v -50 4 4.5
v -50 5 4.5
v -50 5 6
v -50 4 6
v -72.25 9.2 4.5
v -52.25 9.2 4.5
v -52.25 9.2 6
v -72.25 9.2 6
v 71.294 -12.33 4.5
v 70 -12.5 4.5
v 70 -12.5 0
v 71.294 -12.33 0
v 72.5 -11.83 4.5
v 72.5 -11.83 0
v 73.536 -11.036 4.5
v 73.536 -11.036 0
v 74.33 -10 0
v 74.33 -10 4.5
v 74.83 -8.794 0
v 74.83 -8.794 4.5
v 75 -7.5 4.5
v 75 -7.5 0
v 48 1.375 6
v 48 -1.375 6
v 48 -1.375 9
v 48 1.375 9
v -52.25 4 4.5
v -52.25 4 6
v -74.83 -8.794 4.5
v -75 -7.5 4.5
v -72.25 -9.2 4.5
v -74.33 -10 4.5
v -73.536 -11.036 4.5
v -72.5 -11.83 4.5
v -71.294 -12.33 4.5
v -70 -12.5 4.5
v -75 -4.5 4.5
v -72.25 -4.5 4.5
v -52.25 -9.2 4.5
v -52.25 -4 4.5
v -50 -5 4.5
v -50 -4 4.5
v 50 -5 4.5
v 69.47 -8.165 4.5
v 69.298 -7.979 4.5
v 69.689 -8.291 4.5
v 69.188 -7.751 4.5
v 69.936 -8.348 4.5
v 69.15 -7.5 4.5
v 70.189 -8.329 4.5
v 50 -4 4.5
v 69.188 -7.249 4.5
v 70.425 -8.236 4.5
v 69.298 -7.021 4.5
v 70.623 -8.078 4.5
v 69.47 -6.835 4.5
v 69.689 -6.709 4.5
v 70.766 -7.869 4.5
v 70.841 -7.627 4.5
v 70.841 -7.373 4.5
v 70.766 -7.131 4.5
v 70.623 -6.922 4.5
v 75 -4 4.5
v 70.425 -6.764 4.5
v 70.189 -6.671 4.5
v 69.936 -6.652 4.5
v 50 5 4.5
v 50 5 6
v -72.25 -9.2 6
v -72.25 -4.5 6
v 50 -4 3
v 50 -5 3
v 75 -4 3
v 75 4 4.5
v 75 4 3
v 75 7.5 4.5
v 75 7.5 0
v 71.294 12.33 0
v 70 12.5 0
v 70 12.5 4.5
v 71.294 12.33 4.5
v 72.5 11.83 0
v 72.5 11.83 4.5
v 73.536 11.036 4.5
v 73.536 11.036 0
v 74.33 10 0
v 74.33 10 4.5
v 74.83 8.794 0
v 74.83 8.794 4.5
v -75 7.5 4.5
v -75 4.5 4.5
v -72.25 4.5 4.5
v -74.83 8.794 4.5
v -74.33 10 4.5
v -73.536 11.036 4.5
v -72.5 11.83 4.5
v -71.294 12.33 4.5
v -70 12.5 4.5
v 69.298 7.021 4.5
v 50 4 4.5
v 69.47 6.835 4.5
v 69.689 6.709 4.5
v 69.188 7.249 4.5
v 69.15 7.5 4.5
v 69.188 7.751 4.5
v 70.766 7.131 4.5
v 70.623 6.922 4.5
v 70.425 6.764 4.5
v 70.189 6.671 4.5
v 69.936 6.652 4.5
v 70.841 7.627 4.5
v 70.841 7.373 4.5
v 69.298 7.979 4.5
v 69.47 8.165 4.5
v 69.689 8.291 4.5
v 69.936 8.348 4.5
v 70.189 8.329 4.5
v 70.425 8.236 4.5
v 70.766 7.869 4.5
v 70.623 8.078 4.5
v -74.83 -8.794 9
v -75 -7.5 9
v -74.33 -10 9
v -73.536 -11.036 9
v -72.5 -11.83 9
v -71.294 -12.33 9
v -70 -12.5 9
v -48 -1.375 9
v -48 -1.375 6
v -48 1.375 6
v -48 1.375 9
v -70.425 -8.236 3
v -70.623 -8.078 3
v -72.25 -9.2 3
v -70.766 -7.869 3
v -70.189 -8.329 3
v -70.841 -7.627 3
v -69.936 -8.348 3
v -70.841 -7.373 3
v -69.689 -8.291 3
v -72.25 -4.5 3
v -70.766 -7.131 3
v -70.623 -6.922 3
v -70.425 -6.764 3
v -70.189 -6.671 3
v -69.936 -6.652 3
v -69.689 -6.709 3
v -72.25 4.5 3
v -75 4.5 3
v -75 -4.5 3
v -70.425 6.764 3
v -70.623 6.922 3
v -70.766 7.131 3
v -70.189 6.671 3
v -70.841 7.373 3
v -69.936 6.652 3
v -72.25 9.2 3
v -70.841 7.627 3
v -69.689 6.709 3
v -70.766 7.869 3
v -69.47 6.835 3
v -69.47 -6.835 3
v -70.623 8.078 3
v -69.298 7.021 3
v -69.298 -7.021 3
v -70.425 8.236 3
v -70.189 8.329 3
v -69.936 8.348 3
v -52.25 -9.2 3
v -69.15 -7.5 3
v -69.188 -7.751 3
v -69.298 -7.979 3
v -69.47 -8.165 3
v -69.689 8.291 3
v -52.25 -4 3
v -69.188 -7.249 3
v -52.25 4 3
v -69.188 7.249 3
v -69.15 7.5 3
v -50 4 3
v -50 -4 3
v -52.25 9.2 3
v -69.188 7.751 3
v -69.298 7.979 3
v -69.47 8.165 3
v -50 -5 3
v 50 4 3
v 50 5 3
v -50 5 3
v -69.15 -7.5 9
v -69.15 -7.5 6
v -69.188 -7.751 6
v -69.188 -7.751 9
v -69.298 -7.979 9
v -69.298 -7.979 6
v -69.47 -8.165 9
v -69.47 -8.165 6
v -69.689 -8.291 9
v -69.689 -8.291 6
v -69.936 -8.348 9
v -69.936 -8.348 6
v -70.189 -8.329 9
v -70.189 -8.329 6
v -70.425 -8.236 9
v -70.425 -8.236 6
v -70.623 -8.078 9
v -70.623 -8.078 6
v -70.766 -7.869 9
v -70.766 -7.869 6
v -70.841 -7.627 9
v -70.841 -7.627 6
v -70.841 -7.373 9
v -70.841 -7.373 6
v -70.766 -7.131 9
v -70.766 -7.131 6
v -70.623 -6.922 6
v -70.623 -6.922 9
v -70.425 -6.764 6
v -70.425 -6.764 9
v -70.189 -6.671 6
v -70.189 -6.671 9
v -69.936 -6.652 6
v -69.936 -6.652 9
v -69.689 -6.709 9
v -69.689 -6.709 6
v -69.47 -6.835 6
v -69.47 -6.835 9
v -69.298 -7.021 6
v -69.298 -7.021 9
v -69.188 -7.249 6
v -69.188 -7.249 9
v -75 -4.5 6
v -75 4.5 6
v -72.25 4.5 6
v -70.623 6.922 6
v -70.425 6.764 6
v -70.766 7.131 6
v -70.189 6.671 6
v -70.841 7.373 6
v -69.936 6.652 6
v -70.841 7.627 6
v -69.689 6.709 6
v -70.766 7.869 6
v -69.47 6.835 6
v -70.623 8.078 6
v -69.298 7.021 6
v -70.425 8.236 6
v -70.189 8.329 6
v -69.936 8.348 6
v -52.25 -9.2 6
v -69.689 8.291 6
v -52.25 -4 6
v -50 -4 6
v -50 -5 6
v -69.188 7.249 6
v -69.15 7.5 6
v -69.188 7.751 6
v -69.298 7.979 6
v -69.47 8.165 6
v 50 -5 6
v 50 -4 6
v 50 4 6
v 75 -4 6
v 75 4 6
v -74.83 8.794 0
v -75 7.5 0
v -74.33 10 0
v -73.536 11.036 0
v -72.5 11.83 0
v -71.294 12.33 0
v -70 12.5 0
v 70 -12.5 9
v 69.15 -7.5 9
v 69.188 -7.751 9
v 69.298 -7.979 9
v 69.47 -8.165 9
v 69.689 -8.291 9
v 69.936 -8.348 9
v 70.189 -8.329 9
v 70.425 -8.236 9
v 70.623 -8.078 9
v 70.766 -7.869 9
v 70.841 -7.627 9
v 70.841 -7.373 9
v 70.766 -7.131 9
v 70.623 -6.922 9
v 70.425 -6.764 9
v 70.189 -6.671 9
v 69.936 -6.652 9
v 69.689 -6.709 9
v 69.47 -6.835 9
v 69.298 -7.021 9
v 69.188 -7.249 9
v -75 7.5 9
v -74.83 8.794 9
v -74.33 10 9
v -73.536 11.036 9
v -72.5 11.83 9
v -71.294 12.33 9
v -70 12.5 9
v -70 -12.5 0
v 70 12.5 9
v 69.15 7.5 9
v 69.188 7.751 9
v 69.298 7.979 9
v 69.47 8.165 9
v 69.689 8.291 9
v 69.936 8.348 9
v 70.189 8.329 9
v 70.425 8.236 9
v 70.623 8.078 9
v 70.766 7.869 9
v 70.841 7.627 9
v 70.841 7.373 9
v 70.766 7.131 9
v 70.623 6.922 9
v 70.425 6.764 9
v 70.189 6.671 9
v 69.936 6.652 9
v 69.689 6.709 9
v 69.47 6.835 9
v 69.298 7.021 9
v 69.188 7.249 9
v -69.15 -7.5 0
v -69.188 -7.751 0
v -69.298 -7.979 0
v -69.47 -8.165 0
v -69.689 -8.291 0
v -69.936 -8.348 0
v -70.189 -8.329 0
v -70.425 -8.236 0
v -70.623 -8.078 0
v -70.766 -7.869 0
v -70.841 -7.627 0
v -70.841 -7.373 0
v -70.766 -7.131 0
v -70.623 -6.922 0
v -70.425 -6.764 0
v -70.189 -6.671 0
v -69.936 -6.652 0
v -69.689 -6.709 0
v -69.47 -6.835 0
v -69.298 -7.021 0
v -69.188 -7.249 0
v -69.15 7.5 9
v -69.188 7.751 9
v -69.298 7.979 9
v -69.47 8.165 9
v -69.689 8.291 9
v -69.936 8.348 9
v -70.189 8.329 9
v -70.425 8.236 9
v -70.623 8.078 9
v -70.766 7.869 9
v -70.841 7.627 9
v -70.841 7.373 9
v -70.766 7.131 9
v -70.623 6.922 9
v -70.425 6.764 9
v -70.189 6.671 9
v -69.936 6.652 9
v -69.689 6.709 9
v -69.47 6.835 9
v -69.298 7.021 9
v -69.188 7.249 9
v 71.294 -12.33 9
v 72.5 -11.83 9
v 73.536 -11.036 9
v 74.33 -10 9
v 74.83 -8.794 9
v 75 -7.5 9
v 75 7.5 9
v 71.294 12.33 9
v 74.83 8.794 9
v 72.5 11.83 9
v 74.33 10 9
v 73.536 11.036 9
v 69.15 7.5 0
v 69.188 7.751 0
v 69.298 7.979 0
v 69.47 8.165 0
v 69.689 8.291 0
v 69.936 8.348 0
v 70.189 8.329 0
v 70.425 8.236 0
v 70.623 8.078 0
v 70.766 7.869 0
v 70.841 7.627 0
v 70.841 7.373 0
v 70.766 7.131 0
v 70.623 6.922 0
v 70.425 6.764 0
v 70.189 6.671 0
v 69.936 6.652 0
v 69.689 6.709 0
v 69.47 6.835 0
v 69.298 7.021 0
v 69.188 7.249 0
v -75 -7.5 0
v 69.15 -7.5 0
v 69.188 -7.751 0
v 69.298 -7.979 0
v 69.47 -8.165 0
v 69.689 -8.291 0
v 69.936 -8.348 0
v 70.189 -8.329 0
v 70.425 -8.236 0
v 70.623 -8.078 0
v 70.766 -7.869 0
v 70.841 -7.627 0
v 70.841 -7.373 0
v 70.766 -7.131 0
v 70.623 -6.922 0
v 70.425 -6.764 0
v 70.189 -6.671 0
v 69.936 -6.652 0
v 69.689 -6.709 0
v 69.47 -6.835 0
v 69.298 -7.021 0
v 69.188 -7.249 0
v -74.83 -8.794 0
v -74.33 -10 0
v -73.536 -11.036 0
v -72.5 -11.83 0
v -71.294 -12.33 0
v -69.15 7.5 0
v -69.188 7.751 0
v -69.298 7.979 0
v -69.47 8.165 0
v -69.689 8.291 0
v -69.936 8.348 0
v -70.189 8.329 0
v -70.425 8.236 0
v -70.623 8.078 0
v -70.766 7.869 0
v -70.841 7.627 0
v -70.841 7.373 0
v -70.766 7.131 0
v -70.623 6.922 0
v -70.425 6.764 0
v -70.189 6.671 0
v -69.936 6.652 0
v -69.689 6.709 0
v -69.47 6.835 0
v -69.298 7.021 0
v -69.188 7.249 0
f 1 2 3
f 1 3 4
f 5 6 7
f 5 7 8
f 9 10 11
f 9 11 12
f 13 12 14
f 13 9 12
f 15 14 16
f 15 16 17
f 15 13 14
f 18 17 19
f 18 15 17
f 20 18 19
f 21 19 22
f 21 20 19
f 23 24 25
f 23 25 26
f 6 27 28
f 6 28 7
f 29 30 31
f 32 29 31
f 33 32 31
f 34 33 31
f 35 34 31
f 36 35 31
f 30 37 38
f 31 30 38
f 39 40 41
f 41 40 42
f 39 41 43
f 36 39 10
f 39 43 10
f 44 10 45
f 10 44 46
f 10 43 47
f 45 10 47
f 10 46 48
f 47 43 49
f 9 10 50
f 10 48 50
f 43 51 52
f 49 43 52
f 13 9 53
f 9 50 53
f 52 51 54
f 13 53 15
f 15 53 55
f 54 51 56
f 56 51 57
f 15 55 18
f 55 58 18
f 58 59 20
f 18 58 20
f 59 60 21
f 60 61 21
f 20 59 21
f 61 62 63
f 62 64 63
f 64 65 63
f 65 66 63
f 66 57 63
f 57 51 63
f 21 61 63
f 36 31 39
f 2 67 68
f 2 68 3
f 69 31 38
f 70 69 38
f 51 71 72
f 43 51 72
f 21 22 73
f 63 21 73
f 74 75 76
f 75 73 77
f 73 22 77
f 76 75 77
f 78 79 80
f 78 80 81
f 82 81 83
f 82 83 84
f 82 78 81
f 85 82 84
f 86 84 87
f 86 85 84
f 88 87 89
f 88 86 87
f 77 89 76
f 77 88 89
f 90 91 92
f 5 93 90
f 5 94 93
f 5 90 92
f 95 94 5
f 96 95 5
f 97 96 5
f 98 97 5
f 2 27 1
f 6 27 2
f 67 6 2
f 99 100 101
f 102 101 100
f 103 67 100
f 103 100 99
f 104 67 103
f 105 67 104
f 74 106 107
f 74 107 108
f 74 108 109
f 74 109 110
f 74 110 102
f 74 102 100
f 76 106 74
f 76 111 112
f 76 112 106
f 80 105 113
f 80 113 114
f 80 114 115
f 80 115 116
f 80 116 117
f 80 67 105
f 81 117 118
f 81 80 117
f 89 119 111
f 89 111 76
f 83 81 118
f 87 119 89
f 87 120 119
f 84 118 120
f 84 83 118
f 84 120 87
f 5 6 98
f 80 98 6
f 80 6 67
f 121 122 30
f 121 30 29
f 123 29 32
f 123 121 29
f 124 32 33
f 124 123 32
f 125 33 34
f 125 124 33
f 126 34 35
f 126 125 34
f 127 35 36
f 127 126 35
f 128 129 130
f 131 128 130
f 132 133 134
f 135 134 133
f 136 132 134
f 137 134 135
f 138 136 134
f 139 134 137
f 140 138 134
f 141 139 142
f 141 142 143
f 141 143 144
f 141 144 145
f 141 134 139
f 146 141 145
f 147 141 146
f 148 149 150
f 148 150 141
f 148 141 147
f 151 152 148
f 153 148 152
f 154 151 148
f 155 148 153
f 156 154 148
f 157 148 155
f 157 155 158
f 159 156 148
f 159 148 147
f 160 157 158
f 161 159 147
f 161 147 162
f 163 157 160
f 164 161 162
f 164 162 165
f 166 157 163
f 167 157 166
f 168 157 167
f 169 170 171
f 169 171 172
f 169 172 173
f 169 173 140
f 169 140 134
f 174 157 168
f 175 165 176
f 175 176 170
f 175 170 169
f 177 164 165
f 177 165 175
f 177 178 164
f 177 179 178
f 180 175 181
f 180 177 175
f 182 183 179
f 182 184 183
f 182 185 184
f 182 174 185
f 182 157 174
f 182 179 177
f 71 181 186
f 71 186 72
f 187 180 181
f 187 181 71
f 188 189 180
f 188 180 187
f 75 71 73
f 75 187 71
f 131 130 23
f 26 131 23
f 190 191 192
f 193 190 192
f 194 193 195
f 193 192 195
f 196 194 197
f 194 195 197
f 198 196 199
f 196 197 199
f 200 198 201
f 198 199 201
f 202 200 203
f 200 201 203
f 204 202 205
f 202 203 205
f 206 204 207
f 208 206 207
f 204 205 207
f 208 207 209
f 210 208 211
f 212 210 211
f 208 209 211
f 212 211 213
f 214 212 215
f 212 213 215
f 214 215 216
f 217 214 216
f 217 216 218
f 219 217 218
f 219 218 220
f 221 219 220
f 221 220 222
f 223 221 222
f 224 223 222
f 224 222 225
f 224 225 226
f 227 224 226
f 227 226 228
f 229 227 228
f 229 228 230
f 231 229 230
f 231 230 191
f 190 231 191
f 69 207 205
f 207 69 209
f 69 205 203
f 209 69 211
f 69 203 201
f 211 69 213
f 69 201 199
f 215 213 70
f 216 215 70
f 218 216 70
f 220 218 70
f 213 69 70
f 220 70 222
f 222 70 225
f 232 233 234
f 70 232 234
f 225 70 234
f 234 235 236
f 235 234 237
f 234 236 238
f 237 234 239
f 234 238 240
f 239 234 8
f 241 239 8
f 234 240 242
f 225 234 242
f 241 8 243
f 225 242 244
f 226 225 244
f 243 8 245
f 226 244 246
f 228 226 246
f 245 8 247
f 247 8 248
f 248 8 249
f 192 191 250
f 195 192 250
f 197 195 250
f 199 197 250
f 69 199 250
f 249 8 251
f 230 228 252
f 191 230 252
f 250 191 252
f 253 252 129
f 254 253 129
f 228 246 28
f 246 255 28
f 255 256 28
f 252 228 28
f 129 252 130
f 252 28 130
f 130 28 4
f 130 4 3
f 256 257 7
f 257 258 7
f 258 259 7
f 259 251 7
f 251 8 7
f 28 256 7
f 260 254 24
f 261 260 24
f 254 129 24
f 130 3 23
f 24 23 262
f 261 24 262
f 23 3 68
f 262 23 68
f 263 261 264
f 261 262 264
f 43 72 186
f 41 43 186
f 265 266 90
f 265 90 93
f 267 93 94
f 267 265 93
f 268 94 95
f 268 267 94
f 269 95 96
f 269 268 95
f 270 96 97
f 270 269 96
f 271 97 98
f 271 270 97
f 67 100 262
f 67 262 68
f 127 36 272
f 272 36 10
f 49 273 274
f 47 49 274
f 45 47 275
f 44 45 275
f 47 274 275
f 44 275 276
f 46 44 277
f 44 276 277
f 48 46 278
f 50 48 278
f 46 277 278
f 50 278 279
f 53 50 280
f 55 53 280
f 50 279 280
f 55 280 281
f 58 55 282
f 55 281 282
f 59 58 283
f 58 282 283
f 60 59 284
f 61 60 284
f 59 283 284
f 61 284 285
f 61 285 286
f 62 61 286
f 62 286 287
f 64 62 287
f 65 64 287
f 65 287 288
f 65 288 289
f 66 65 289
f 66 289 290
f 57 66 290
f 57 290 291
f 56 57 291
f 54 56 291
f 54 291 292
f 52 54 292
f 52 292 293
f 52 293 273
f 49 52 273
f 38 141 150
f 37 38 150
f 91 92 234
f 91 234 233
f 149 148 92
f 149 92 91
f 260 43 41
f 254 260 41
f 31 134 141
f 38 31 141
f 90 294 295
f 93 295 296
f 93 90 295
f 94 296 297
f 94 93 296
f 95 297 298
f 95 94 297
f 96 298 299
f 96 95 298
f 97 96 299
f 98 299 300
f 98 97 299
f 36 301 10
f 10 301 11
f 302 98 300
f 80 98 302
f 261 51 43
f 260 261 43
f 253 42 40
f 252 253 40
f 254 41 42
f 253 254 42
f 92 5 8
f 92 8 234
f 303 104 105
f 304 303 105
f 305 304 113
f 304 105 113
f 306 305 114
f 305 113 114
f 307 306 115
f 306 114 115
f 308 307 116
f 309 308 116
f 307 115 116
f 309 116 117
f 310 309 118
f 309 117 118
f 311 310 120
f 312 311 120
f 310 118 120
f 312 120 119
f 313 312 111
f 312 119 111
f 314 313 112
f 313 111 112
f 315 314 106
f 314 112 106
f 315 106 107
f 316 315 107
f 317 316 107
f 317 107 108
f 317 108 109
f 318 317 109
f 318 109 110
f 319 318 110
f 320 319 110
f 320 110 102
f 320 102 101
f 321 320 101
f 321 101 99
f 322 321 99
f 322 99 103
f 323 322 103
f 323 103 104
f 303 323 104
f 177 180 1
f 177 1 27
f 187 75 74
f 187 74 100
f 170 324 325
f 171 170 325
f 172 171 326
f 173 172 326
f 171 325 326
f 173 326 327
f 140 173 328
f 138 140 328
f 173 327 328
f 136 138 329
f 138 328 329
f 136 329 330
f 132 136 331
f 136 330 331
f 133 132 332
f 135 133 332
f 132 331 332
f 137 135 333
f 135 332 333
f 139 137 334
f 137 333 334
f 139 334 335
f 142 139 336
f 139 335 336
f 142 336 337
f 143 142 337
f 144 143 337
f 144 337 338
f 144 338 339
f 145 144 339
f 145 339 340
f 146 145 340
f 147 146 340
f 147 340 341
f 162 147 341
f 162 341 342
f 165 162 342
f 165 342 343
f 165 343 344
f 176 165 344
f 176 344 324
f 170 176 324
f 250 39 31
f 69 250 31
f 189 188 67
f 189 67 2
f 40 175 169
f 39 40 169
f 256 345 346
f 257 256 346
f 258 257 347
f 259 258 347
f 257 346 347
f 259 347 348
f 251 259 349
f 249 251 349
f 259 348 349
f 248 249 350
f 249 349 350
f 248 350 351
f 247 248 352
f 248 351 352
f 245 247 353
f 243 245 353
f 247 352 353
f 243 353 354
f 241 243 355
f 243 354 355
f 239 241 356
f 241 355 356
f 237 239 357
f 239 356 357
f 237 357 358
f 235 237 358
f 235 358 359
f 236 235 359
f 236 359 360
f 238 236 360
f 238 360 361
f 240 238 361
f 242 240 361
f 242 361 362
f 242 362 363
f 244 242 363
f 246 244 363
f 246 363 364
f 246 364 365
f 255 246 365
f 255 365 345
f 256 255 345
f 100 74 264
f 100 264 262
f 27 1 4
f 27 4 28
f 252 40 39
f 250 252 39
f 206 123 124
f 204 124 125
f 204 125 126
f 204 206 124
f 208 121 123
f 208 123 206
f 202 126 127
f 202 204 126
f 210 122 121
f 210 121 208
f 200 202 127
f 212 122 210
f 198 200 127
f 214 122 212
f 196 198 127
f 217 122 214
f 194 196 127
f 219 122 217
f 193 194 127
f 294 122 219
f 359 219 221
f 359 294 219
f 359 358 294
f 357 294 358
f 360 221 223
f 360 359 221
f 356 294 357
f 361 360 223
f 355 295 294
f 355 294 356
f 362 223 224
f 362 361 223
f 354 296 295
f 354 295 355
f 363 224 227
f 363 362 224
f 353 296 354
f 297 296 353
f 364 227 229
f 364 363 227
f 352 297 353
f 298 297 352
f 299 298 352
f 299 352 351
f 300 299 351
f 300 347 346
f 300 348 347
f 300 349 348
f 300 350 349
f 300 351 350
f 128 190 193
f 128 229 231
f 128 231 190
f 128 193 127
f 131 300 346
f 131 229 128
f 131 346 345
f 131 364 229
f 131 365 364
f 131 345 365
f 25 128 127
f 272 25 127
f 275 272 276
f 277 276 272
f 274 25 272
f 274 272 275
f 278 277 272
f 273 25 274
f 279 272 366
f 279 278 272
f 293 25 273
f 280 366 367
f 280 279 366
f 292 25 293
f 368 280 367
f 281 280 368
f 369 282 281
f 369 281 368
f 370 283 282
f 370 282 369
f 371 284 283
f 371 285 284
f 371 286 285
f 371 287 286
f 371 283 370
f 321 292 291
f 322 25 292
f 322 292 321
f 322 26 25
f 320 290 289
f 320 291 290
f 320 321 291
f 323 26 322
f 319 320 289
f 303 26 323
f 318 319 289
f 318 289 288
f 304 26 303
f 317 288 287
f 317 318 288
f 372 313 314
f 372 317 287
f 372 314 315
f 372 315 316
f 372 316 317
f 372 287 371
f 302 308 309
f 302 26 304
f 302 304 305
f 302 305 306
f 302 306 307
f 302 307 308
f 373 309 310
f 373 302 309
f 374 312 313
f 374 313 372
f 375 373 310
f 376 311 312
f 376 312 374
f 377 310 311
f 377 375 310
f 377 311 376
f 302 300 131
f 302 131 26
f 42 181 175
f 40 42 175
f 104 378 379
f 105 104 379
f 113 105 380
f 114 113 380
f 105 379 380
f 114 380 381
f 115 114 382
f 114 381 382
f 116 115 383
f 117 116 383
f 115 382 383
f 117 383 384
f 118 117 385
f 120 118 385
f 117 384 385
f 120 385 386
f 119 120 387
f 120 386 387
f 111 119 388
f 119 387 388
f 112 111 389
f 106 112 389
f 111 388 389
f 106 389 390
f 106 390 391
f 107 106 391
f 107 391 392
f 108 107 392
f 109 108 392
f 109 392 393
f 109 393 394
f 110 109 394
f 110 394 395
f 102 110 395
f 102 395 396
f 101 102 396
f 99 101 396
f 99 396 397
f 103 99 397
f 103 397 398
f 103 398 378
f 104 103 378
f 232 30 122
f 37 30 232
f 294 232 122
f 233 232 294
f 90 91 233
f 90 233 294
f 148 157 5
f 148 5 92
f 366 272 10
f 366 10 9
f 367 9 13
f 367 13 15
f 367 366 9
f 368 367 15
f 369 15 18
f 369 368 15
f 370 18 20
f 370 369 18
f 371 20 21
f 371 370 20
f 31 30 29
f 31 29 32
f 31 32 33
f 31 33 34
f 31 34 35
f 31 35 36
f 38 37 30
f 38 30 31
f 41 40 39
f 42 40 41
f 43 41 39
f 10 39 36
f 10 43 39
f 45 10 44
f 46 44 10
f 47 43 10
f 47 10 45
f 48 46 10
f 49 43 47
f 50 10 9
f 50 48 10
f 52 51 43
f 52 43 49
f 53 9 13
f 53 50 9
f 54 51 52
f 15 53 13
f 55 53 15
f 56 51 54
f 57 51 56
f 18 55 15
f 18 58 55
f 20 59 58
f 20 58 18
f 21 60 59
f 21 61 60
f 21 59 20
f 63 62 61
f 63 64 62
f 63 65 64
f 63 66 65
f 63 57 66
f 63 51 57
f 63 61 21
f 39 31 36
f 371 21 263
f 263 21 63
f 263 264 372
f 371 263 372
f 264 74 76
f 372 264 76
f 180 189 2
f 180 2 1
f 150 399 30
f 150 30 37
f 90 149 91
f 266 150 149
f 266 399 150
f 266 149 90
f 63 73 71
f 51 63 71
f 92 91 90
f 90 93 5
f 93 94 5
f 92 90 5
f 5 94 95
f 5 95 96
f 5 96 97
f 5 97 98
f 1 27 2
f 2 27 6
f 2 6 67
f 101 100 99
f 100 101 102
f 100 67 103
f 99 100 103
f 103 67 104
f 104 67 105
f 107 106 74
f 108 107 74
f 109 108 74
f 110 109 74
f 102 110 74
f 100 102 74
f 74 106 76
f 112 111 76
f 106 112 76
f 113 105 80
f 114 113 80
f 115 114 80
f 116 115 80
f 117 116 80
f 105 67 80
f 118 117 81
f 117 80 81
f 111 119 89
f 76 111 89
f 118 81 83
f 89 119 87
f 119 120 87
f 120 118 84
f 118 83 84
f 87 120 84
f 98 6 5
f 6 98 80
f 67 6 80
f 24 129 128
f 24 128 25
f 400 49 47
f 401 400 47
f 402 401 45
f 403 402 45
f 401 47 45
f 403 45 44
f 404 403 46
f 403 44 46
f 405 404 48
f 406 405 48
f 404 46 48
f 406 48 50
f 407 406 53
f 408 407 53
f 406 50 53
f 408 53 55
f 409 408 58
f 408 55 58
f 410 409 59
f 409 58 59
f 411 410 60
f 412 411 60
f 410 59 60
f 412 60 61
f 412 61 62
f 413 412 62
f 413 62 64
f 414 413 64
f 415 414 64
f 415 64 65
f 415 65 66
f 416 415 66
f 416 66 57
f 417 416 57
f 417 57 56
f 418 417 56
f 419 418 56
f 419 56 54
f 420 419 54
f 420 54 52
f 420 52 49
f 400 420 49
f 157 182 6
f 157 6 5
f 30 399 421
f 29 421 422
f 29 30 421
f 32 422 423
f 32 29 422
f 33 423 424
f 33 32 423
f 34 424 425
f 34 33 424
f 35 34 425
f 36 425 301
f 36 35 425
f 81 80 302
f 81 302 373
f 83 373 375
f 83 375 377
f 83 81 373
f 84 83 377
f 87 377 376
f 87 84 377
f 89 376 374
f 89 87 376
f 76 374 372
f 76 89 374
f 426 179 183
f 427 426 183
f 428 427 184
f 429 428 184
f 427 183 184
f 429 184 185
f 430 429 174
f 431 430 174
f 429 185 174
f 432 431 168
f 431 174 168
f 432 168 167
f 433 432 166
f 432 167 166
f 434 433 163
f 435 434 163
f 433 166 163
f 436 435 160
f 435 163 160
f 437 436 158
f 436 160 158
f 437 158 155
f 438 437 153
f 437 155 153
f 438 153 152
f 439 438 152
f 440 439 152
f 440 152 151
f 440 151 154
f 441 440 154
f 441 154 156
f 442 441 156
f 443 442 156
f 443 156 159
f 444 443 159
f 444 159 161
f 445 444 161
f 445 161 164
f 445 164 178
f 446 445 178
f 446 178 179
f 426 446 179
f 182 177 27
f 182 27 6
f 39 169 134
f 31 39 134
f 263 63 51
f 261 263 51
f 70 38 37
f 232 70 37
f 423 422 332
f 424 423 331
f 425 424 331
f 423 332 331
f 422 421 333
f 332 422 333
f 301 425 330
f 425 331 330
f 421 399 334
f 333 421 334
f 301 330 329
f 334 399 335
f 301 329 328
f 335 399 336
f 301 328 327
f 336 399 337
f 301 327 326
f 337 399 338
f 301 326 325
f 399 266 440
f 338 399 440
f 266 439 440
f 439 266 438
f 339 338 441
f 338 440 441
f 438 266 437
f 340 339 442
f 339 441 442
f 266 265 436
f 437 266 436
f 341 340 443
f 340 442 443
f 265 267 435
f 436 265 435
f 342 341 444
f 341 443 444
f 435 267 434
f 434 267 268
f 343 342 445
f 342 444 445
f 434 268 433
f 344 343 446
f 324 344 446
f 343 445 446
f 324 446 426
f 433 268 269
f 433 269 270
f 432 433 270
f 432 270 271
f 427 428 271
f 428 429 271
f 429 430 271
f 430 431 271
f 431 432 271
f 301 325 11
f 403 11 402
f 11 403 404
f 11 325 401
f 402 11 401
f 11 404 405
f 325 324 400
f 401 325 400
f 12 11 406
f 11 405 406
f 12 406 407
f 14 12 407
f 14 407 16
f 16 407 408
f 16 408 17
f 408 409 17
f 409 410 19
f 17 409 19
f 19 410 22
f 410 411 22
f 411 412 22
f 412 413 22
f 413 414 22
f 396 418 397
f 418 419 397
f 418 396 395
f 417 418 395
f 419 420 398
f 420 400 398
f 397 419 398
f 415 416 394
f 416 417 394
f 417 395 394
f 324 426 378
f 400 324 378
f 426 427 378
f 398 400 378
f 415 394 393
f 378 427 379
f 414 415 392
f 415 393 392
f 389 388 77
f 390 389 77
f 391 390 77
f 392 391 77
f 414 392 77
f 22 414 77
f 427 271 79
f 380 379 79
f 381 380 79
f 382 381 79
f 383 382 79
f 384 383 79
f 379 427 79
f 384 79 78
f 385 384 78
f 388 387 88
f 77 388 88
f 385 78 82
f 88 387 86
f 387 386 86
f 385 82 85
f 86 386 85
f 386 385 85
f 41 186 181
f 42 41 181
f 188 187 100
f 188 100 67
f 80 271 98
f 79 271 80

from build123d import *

# Parameters (mm, degrees)
BOX_BOTTOM_HALF_0_W     = 152
BOX_BOTTOM_HALF_0_H     = 27
BOX_BOTTOM_HALF_0_DEPTH = 5.5
SKETCH_W                = 150
SKETCH_H                = 25
PAD_DEPTH               = 3
PAD001_DEPTH            = 3
SKETCH004_W             = 150
SKETCH004_H             = 25
SKETCH004_W_2           = 96
SKETCH004_H_2           = 2.75
PAD002_DEPTH            = 3
SKETCH005_R             = 0.85
POCKET_DEPTH            = 313.671314
POLARPATTERN_COUNT      = 2
POLARPATTERN001_COUNT   = 2
POLARPATTERN002_COUNT   = 2
FILLET_R                = 5


with BuildPart() as box_bottom_half_0_body:
    # box_bottom_half_0 → box_bottom_half_0 (new body)
    with BuildSketch(Plane(origin=(-76, -13.5, -1), x_dir=(1, 0, 0), z_dir=(0, 0, 1))):
        with Locations((76, 13.5)):
            Rectangle(BOX_BOTTOM_HALF_0_W, BOX_BOTTOM_HALF_0_H)
    extrude(amount=BOX_BOTTOM_HALF_0_DEPTH)


with BuildPart() as body:
    # Sketch → Pad (new body)
    with BuildSketch(Plane.XY):
        Rectangle(SKETCH_W, SKETCH_H)
    extrude(amount=PAD_DEPTH)

    # Sketch001 (on Face6 of Pad) → Pad001 (join)
    with BuildSketch(Plane.XY.offset(3)):
        Polygon((-75, 12.5), (75, 12.5), (75, 4), (50, 4), (50, 5), (-50, 5), (-50, 4), (-52.25, 4), (-52.25, 9.2), (-72.25, 9.2), (-72.25, 4.5), (-75, 4.5), align=None)
        Polygon((-75, -12.5), (75, -12.5), (75, -4), (50, -4), (50, -5), (-50, -5), (-50, -4), (-52.25, -4), (-52.25, -9.2), (-72.25, -9.2), (-72.25, -4.5), (-75, -4.5), align=None)
    extrude(amount=PAD001_DEPTH)

    # Sketch004 (on Face12 of Pad001) → Pad002 (join)
    with BuildSketch(Plane.XY.offset(6)):
        Rectangle(SKETCH004_W, SKETCH004_H)
        Rectangle(SKETCH004_W_2, SKETCH004_H_2, mode=Mode.SUBTRACT)
    extrude(amount=PAD002_DEPTH)

    # Sketch005 (on Face34 of Pad002) → Pocket (cut, through all)
    with BuildSketch(Plane.XY.offset(9)):
        with Locations((-70, 7.5)):
            Circle(SKETCH005_R)
    pocket = extrude(amount=-POCKET_DEPTH, mode=Mode.SUBTRACT)

    # PolarPattern: Pocket ×2 about axis
    polarpattern_axis = Axis((0, 0, 9), (0, 0, 1))
    for i in range(1, POLARPATTERN_COUNT):
        add(pocket.rotate(polarpattern_axis, i * 360 / POLARPATTERN_COUNT), mode=Mode.SUBTRACT)

    # PolarPattern001: Pocket ×2 about axis
    polarpattern001_axis = Axis((0, 0, 0), (0, 1, 0))
    for i in range(1, POLARPATTERN001_COUNT):
        add(pocket.rotate(polarpattern001_axis, i * 360 / POLARPATTERN001_COUNT), mode=Mode.SUBTRACT)

    # PolarPattern002: Pocket ×2 about axis
    polarpattern002_axis = Axis((0, 0, 0), (1, 0, 0))
    for i in range(1, POLARPATTERN002_COUNT):
        add(pocket.rotate(polarpattern002_axis, i * 360 / POLARPATTERN002_COUNT), mode=Mode.SUBTRACT)

    # Fillet
    fillet_edges = [body.edges().sort_by_distance(p)[0] for p in [
        (75, -12.5, 7.5),
        (75, 12.5, 7.5),
        (-75, -12.5, 7.5),
        (-75, 12.5, 7.5),
    ]]
    fillet(fillet_edges, radius=FILLET_R)


with BuildPart() as bottom_half_0_body:
    # bottom_half_0 base: copy of Body
    add(body.part)

    # bottom_half_0: intersect box_bottom_half_0 body
    add(box_bottom_half_0_body.part, mode=Mode.INTERSECT)


with BuildPart() as top_half_0_body:
    # top_half_0 base: copy of Body
    add(body.part)

    # top_half_0: cut box_bottom_half_0 body
    add(box_bottom_half_0_body.part, mode=Mode.SUBTRACT)


solid = Compound([bottom_half_0_body.part, top_half_0_body.part])
